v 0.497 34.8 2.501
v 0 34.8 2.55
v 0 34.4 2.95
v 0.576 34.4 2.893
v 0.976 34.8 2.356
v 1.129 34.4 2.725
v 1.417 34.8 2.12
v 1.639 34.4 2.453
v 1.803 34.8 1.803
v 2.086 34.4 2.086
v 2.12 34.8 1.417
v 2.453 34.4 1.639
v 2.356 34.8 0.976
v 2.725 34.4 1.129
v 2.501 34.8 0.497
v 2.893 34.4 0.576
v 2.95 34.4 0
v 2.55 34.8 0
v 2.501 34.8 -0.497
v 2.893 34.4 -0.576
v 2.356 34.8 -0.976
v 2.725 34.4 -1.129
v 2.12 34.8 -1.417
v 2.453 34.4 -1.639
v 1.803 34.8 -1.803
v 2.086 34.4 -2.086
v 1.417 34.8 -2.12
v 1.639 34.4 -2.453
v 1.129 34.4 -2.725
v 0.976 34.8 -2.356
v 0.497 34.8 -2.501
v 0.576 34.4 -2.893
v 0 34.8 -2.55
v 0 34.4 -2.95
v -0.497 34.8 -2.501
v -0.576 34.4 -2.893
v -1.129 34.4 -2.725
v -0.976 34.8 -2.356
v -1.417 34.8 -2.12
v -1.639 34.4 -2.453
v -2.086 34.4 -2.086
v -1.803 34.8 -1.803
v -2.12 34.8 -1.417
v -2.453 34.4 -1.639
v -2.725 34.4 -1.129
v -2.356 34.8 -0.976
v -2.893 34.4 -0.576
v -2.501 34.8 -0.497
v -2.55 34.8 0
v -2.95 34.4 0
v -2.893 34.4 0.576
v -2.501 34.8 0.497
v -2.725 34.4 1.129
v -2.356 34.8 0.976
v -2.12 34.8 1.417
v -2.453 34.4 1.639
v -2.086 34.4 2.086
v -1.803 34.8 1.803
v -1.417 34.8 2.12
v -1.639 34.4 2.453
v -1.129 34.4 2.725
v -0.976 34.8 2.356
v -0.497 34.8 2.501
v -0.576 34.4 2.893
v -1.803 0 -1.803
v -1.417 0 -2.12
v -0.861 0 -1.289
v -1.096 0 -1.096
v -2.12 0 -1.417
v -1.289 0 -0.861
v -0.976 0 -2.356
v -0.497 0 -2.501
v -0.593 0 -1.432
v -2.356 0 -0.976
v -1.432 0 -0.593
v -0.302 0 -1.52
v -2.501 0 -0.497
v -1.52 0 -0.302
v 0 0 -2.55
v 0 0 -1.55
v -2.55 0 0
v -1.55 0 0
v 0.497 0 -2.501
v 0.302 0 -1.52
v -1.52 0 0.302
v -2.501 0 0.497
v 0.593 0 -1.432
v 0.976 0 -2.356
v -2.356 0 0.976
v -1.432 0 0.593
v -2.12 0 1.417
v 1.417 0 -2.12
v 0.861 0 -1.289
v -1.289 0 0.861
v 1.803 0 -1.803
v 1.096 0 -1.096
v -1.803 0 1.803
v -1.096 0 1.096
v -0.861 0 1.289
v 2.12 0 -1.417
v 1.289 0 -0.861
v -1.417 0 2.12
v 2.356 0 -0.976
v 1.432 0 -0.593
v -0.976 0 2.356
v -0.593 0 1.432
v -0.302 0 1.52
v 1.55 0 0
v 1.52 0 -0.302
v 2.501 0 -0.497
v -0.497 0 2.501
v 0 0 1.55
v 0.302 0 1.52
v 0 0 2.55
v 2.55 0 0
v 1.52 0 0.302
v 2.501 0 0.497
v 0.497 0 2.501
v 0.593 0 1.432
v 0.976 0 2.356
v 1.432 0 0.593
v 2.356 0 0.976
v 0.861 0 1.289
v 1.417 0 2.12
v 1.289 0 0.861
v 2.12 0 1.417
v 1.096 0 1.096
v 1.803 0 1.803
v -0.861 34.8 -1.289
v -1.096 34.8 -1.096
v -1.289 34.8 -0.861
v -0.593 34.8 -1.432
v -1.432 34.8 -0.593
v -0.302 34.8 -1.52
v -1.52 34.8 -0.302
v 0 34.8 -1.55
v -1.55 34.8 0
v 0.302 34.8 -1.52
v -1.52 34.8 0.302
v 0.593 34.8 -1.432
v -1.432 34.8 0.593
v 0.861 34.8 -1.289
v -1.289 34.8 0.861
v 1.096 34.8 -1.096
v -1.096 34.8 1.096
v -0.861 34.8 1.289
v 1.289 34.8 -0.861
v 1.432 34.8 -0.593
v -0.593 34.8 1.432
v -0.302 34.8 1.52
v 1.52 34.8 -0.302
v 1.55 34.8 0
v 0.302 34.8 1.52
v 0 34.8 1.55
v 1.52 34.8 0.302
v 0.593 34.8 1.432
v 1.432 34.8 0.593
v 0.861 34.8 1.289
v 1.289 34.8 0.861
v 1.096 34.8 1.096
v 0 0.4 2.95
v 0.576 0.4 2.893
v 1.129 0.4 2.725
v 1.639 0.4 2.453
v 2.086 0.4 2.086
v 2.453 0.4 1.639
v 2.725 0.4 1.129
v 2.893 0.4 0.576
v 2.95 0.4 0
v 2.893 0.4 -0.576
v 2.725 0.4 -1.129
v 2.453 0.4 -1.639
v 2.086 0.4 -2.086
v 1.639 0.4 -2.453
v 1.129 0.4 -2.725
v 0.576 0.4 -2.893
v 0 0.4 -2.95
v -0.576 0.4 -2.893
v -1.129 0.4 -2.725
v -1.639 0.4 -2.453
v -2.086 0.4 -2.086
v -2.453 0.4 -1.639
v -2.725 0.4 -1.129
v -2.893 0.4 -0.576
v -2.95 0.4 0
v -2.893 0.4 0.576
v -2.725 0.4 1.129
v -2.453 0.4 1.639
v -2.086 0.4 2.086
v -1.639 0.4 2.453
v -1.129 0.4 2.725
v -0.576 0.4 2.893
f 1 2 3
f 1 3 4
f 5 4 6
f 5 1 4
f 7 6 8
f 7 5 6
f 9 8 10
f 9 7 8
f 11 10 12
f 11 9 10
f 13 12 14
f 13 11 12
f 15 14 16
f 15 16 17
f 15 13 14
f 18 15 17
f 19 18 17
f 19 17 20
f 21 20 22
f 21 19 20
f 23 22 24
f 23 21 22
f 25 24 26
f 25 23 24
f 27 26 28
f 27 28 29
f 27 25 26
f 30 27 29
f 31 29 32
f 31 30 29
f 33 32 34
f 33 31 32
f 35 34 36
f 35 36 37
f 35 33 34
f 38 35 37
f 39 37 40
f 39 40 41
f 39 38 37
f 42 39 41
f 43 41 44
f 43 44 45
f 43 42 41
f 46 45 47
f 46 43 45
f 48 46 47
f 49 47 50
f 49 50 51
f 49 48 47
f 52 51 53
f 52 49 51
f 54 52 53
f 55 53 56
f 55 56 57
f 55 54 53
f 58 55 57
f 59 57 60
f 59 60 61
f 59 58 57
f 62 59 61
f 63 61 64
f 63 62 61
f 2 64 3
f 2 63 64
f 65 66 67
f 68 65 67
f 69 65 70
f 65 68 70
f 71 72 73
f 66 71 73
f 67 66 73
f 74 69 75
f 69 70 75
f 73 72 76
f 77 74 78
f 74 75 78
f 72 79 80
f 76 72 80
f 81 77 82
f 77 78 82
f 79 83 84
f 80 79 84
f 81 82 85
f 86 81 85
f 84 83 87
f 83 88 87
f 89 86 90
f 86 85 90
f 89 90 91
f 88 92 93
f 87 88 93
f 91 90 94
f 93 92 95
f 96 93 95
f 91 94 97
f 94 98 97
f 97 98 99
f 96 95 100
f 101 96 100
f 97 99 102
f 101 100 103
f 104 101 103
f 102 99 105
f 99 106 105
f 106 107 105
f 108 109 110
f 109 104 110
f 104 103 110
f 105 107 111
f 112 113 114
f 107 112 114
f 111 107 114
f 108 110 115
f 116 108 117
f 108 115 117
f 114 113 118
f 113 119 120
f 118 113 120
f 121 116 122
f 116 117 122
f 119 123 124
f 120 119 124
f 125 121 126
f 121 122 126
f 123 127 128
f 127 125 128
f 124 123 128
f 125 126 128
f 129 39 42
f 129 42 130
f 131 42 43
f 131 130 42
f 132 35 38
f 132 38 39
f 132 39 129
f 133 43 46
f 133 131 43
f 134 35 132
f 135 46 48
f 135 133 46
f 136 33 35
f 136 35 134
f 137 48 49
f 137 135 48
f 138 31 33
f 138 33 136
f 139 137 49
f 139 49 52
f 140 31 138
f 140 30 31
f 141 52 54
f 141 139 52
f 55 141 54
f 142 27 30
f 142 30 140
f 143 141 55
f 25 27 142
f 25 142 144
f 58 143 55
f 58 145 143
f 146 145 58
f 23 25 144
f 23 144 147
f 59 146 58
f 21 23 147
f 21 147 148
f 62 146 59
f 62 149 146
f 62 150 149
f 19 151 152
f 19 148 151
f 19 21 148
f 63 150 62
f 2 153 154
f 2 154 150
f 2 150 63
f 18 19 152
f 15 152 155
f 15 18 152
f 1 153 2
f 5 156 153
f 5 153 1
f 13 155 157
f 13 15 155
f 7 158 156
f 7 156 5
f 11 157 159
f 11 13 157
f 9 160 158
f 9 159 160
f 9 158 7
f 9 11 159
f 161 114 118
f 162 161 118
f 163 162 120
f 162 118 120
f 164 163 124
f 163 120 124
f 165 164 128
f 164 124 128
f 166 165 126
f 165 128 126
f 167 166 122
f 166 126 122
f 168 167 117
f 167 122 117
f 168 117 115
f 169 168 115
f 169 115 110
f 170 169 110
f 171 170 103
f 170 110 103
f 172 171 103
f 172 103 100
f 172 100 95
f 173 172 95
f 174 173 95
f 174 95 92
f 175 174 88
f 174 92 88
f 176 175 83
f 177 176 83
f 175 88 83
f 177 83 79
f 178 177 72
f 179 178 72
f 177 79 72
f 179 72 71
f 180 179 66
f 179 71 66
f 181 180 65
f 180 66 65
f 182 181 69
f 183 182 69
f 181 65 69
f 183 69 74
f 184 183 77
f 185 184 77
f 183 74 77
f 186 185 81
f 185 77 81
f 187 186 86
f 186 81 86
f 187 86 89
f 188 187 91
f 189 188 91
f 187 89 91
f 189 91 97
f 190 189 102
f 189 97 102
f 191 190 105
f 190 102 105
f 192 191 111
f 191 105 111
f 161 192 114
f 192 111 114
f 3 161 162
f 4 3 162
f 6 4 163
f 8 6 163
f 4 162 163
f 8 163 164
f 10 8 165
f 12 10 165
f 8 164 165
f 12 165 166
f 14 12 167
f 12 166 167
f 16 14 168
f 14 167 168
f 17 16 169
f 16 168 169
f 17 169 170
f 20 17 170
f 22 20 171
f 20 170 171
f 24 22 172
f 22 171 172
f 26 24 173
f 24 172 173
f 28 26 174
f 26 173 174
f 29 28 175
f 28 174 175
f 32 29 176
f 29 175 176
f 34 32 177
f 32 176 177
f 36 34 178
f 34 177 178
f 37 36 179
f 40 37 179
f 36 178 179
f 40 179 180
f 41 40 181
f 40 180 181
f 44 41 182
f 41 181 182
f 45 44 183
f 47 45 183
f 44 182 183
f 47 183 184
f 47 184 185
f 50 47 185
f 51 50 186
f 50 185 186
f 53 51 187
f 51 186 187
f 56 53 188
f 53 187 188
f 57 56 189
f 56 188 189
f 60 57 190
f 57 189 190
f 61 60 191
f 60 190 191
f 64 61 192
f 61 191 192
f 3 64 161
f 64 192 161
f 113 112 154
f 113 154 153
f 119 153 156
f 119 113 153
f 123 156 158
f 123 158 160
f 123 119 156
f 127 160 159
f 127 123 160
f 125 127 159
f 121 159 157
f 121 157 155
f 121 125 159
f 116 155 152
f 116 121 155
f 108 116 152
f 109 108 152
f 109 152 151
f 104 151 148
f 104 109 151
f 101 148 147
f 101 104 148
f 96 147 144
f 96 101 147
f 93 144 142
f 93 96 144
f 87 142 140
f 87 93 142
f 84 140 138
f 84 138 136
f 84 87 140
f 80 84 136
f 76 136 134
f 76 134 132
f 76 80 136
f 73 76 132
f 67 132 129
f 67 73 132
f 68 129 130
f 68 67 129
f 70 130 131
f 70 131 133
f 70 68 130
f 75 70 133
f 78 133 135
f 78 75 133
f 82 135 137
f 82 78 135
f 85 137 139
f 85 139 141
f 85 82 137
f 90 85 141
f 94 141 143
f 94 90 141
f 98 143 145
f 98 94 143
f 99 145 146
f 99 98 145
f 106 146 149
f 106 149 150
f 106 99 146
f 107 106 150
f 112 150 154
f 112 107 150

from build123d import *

# Parameters (mm, degrees)
SKETCH2_R           = 2.95
SKETCH2_R_2         = 1.55
BOSS_EXTRUDE1_DEPTH = 34.8
CHAMFER3_SIZE       = 0.4
CHAMFER4_SIZE       = 0.4


with BuildPart() as part:
    # Sketch2 → Boss-Extrude1 (new body)
    with BuildSketch(Plane(origin=(0, 0, 0), x_dir=(1, 0, 0), z_dir=(0, 1, 0))):
        with Locations(Location((0, 0, 0), (0, 0, 270))):
            Circle(SKETCH2_R)
        with Locations(Location((0, 0, 0), (0, 0, 270))):
            Circle(SKETCH2_R_2, mode=Mode.SUBTRACT)
    extrude(amount=BOSS_EXTRUDE1_DEPTH)

    # Chamfer3
    chamfer3_edges = [part.edges().sort_by_distance(p)[0] for p in [
        (0, 0, -2.95),
    ]]
    chamfer(chamfer3_edges, length=CHAMFER3_SIZE)

    # Chamfer4
    chamfer4_edges = [part.edges().sort_by_distance(p)[0] for p in [
        (0, 34.8, -2.95),
    ]]
    chamfer(chamfer4_edges, length=CHAMFER4_SIZE)


solid = part.part
